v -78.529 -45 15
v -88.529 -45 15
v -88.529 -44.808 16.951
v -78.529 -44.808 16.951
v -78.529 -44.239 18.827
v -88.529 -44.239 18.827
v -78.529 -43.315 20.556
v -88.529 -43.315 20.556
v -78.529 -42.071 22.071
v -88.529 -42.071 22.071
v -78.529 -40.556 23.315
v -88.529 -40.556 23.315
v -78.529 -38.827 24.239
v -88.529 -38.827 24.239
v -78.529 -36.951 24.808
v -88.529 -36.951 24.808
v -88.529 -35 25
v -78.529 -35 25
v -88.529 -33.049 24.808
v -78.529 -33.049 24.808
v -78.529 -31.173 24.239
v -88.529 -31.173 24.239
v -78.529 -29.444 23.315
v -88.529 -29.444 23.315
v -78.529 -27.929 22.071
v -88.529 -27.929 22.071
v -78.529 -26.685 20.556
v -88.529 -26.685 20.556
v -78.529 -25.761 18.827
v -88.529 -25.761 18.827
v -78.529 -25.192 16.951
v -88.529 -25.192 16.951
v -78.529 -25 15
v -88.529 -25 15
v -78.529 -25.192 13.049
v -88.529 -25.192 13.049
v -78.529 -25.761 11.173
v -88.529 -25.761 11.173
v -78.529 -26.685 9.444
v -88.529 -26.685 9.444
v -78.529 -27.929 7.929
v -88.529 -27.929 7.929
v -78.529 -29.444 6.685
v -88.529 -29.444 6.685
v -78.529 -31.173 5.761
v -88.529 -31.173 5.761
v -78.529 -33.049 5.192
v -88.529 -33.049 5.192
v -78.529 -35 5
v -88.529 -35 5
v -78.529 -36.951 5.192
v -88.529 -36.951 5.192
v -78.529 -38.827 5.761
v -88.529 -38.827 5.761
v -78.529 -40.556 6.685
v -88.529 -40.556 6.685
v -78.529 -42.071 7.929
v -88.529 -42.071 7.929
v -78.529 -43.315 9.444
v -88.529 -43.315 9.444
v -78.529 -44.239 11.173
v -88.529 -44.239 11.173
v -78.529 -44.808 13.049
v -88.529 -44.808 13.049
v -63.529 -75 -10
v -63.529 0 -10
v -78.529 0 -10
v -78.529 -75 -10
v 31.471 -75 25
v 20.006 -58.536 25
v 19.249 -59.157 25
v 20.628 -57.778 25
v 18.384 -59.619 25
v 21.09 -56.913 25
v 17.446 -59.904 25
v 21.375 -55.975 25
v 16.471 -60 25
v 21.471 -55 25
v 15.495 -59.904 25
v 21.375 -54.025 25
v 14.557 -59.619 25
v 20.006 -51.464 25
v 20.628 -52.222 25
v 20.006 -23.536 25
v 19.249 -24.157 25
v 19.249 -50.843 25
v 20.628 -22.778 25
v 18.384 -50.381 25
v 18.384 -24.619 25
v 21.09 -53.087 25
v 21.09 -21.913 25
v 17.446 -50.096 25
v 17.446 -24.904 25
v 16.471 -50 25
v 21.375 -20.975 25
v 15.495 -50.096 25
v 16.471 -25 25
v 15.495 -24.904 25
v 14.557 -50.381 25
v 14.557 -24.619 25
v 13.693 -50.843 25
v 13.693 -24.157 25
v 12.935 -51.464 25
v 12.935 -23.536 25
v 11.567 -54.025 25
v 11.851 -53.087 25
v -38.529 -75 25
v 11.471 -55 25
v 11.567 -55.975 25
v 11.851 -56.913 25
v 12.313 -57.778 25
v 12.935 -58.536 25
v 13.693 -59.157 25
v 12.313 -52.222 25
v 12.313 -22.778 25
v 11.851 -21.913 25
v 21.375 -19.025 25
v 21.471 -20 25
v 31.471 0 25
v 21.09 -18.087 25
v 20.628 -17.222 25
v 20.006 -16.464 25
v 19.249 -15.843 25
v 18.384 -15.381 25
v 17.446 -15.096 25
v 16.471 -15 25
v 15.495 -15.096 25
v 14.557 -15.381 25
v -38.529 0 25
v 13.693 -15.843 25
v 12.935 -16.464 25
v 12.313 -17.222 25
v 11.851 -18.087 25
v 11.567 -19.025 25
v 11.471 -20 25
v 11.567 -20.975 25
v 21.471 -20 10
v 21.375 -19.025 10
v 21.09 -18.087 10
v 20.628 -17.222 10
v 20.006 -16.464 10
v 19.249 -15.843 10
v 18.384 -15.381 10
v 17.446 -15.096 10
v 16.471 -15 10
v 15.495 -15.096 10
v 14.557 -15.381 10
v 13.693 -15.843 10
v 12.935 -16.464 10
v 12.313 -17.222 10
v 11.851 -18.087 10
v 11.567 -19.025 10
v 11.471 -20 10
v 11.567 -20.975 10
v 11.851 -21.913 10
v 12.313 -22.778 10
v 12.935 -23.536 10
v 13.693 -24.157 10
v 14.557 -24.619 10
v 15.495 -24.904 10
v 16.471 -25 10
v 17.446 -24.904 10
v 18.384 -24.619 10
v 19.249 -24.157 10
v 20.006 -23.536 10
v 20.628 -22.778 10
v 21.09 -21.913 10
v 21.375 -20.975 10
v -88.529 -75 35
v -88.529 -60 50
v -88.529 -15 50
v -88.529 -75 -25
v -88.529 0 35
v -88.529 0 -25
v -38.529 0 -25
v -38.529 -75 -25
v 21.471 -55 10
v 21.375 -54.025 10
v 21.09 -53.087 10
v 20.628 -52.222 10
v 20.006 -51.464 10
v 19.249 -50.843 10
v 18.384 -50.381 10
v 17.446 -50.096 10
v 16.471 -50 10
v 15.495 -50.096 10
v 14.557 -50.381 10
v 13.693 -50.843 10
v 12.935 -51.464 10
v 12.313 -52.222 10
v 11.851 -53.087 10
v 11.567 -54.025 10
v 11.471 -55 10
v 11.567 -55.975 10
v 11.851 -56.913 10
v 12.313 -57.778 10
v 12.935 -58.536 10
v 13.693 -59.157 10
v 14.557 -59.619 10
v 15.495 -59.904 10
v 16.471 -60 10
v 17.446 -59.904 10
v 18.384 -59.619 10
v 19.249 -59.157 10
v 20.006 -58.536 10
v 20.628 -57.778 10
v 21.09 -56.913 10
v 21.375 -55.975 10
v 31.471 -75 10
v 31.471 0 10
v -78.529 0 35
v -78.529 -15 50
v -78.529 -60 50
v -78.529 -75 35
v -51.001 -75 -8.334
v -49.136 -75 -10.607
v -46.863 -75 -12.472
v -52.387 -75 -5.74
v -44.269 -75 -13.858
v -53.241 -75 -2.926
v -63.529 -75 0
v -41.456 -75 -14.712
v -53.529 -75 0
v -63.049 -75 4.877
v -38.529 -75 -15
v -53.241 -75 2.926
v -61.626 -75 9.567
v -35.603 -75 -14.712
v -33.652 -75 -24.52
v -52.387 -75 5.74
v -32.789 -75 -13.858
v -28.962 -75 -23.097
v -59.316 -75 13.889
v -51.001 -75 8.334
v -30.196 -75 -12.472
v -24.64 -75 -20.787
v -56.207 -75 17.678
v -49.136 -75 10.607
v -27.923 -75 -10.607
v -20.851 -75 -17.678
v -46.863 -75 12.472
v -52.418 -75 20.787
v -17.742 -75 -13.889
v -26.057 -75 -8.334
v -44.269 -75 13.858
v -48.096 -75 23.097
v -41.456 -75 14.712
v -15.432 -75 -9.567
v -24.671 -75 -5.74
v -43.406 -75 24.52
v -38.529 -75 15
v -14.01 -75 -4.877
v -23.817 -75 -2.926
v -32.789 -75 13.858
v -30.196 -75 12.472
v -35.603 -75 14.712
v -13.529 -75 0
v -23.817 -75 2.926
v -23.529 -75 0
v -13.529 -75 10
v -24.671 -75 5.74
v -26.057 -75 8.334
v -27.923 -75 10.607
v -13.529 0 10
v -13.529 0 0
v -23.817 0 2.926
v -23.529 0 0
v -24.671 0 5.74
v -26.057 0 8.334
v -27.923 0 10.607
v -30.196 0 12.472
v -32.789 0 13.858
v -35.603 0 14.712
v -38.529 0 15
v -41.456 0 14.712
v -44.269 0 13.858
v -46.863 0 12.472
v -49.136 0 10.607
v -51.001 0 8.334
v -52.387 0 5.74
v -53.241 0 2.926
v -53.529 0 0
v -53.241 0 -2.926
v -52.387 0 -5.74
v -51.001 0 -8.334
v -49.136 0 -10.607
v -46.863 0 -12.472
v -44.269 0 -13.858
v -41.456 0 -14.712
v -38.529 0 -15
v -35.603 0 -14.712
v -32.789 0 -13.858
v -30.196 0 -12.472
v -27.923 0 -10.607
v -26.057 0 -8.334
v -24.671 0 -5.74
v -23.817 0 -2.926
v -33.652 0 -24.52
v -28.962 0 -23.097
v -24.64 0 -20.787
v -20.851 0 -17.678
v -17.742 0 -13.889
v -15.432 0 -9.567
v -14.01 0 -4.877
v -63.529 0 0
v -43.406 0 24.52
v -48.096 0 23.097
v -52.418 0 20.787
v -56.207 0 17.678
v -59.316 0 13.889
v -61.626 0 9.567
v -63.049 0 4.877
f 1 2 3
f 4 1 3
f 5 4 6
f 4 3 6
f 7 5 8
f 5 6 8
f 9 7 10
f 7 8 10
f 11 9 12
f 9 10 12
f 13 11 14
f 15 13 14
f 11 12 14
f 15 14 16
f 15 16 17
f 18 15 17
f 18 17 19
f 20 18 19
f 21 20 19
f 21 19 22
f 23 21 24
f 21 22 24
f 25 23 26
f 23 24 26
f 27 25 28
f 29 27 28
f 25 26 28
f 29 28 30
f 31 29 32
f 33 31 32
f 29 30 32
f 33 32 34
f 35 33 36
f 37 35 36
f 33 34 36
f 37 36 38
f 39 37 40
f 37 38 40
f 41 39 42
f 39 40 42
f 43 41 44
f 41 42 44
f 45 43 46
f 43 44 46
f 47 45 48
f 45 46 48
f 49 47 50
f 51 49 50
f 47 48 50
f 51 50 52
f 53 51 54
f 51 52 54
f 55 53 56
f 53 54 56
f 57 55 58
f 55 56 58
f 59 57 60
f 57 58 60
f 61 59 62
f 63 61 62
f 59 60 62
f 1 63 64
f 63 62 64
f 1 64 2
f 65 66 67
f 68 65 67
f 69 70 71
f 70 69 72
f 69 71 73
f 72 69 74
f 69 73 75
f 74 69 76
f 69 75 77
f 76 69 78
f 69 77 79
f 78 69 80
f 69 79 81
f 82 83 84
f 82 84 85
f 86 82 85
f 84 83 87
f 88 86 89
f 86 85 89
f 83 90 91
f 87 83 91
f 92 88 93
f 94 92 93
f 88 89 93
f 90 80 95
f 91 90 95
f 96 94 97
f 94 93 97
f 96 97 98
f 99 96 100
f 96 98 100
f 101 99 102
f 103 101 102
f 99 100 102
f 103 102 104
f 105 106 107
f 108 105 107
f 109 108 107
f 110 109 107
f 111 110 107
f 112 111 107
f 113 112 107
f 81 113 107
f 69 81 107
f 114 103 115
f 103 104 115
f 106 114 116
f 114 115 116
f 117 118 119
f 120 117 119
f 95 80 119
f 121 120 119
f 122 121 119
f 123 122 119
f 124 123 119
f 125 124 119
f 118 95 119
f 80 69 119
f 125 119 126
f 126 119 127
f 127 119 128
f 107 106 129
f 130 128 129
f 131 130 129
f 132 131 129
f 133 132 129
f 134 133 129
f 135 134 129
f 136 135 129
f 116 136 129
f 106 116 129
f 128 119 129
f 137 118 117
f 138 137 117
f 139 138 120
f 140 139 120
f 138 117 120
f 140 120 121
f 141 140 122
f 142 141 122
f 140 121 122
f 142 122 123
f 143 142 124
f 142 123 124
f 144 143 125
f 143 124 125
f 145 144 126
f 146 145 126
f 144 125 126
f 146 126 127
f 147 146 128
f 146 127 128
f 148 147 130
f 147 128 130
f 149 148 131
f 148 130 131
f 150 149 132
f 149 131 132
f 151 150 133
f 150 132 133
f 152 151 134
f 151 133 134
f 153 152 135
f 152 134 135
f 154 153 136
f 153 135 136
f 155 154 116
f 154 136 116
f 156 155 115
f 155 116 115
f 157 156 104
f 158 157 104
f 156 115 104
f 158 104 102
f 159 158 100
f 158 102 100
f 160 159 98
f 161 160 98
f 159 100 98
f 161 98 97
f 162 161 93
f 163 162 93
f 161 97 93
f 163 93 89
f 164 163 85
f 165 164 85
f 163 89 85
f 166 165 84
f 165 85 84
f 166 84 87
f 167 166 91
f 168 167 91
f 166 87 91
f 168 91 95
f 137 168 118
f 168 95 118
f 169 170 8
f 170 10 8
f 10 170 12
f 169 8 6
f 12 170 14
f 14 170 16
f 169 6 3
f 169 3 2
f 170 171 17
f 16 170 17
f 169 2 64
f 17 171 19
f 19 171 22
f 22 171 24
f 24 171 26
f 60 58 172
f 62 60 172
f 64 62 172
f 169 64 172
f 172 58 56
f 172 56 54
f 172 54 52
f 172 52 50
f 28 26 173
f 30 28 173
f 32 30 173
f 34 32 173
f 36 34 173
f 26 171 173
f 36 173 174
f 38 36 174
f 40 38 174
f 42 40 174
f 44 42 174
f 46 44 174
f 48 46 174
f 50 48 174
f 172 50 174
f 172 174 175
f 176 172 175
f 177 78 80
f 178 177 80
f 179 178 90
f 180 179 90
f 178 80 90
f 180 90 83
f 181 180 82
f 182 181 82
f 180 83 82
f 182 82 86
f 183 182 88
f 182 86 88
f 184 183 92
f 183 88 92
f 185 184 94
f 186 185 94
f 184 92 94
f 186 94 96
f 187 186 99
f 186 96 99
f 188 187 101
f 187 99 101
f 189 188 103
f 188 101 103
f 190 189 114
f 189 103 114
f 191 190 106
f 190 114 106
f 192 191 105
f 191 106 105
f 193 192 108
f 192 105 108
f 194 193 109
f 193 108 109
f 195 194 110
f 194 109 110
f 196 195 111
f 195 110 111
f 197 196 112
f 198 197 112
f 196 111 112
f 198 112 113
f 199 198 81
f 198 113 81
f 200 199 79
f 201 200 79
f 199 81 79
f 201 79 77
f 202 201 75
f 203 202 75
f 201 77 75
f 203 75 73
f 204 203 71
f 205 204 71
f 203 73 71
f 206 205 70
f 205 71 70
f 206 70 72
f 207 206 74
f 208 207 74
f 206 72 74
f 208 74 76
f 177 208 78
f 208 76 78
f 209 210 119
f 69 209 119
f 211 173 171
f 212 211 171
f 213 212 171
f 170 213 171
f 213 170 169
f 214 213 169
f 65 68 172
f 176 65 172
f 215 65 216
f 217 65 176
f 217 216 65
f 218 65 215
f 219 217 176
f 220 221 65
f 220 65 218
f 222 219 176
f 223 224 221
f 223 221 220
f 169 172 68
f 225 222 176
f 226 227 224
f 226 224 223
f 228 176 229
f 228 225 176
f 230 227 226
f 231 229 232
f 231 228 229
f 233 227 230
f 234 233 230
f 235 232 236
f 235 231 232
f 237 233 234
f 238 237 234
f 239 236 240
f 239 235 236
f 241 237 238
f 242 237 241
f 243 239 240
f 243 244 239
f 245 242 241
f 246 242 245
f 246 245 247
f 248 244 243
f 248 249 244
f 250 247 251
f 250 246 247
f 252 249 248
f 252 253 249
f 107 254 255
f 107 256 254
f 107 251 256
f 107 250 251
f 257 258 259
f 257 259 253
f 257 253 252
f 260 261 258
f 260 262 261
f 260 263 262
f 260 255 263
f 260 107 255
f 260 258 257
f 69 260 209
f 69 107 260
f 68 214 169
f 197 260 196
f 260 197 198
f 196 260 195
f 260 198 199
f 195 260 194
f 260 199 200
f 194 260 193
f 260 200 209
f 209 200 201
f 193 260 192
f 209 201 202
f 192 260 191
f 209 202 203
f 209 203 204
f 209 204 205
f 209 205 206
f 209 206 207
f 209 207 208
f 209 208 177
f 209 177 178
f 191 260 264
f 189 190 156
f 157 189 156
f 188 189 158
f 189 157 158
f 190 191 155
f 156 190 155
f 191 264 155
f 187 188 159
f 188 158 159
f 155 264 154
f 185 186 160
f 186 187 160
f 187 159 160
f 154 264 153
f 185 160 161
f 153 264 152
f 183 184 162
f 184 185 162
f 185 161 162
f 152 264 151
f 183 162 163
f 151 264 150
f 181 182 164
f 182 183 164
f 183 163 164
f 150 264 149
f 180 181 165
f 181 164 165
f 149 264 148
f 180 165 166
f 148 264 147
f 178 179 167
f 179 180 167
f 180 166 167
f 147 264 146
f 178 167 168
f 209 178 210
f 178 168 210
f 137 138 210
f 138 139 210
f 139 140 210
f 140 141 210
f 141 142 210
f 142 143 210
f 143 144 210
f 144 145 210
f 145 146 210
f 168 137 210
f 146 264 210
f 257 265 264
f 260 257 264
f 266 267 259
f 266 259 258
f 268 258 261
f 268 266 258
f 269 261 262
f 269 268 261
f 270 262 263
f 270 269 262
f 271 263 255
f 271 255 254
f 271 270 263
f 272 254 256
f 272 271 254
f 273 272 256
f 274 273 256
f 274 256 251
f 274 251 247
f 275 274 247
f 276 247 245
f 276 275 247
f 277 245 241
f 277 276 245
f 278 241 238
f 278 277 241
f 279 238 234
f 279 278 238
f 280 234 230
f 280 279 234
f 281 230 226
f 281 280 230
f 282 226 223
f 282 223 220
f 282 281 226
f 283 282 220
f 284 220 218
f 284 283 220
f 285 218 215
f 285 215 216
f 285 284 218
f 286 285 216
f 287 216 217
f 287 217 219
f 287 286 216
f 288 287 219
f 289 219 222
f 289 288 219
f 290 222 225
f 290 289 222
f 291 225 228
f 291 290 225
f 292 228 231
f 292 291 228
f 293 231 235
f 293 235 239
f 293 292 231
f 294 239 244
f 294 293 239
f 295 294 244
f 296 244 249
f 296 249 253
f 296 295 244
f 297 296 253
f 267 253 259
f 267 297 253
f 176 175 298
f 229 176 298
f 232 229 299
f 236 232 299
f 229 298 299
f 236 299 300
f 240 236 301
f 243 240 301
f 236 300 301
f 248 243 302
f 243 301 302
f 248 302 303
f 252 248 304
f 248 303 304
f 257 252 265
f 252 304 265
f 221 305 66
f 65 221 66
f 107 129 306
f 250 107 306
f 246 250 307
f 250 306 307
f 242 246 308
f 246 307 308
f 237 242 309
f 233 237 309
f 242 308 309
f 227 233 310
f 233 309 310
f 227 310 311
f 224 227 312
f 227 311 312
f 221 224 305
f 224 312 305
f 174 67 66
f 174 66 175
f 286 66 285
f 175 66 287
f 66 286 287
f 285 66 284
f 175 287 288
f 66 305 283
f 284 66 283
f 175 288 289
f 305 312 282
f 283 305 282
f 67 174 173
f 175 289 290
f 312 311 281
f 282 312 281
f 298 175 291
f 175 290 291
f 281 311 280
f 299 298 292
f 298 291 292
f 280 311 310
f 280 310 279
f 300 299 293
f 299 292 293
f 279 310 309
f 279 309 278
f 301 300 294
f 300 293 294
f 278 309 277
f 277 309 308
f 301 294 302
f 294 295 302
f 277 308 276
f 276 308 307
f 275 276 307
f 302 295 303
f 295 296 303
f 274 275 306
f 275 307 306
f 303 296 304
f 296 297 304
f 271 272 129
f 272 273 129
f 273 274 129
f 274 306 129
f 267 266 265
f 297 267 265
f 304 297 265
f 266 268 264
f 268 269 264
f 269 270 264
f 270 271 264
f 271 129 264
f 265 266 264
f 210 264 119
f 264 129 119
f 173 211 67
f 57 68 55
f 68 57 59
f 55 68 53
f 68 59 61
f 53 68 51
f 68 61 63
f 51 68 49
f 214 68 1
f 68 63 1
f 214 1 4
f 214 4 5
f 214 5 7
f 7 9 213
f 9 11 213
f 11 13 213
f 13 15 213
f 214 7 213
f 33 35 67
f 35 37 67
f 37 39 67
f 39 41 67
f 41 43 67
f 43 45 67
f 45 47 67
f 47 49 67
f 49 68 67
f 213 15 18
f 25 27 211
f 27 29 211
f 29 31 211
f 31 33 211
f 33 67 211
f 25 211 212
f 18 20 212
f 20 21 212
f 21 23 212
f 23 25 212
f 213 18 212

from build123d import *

# Parameters (mm, degrees)
F0_R     = 15
F1_DEPTH = 75
F2_R     = 10
F3_DEPTH = 10
F4_R     = 5
F5_DEPTH = 15


with BuildPart() as f1:
    # F0 (on Front) → F1 (new body)
    with BuildSketch(Plane.XZ):
        with BuildLine():
            Line((-88.529155, 50), (-88.529155, -25))
            Line((-88.529155, -25), (-38.529155, -25))
            ThreePointArc((-38.529155, -25), (-20.851485, -17.67767), (-13.529155, 0))
            Line((-13.529155, 0), (-13.529155, 10))
            Line((-13.529155, 10), (31.470845, 10))
            Line((31.470845, 10), (31.470845, 25))
            Line((31.470845, 25), (-38.529155, 25))
            ThreePointArc((-38.529155, 25), (-56.206824, 17.67767), (-63.529155, 0))
            Line((-63.529155, 0), (-63.529155, -10))
            Line((-63.529155, -10), (-78.529155, -10))
            Line((-78.529155, -10), (-78.529155, 50))
            Line((-78.529155, 50), (-88.529155, 50))
        make_face()
        with Locations((-38.529155, 0)):
            Circle(F0_R, mode=Mode.SUBTRACT)
    extrude(amount=F1_DEPTH)

    # F2 (on face) → F3 (cut)
    with BuildSketch(Plane(origin=(-88.529155, 0, 0), x_dir=(0, -1, 0), z_dir=(-1, 0, 0))):
        Polygon((0, 35), (15, 50), (0, 50), align=None)
        Polygon((75, 50), (60, 50), (75, 35), align=None)
        with Locations((35, 15)):
            Circle(F2_R)
    extrude(amount=-F3_DEPTH, mode=Mode.SUBTRACT)

    # F4 (on face) → F5 (cut)
    with BuildSketch(Plane.XY.offset(25)):
        with Locations((16.470845, -20)):
            Circle(F4_R)
        with Locations((16.470845, -55)):
            Circle(F4_R)
    extrude(amount=-F5_DEPTH, mode=Mode.SUBTRACT)


solid = f1.part
